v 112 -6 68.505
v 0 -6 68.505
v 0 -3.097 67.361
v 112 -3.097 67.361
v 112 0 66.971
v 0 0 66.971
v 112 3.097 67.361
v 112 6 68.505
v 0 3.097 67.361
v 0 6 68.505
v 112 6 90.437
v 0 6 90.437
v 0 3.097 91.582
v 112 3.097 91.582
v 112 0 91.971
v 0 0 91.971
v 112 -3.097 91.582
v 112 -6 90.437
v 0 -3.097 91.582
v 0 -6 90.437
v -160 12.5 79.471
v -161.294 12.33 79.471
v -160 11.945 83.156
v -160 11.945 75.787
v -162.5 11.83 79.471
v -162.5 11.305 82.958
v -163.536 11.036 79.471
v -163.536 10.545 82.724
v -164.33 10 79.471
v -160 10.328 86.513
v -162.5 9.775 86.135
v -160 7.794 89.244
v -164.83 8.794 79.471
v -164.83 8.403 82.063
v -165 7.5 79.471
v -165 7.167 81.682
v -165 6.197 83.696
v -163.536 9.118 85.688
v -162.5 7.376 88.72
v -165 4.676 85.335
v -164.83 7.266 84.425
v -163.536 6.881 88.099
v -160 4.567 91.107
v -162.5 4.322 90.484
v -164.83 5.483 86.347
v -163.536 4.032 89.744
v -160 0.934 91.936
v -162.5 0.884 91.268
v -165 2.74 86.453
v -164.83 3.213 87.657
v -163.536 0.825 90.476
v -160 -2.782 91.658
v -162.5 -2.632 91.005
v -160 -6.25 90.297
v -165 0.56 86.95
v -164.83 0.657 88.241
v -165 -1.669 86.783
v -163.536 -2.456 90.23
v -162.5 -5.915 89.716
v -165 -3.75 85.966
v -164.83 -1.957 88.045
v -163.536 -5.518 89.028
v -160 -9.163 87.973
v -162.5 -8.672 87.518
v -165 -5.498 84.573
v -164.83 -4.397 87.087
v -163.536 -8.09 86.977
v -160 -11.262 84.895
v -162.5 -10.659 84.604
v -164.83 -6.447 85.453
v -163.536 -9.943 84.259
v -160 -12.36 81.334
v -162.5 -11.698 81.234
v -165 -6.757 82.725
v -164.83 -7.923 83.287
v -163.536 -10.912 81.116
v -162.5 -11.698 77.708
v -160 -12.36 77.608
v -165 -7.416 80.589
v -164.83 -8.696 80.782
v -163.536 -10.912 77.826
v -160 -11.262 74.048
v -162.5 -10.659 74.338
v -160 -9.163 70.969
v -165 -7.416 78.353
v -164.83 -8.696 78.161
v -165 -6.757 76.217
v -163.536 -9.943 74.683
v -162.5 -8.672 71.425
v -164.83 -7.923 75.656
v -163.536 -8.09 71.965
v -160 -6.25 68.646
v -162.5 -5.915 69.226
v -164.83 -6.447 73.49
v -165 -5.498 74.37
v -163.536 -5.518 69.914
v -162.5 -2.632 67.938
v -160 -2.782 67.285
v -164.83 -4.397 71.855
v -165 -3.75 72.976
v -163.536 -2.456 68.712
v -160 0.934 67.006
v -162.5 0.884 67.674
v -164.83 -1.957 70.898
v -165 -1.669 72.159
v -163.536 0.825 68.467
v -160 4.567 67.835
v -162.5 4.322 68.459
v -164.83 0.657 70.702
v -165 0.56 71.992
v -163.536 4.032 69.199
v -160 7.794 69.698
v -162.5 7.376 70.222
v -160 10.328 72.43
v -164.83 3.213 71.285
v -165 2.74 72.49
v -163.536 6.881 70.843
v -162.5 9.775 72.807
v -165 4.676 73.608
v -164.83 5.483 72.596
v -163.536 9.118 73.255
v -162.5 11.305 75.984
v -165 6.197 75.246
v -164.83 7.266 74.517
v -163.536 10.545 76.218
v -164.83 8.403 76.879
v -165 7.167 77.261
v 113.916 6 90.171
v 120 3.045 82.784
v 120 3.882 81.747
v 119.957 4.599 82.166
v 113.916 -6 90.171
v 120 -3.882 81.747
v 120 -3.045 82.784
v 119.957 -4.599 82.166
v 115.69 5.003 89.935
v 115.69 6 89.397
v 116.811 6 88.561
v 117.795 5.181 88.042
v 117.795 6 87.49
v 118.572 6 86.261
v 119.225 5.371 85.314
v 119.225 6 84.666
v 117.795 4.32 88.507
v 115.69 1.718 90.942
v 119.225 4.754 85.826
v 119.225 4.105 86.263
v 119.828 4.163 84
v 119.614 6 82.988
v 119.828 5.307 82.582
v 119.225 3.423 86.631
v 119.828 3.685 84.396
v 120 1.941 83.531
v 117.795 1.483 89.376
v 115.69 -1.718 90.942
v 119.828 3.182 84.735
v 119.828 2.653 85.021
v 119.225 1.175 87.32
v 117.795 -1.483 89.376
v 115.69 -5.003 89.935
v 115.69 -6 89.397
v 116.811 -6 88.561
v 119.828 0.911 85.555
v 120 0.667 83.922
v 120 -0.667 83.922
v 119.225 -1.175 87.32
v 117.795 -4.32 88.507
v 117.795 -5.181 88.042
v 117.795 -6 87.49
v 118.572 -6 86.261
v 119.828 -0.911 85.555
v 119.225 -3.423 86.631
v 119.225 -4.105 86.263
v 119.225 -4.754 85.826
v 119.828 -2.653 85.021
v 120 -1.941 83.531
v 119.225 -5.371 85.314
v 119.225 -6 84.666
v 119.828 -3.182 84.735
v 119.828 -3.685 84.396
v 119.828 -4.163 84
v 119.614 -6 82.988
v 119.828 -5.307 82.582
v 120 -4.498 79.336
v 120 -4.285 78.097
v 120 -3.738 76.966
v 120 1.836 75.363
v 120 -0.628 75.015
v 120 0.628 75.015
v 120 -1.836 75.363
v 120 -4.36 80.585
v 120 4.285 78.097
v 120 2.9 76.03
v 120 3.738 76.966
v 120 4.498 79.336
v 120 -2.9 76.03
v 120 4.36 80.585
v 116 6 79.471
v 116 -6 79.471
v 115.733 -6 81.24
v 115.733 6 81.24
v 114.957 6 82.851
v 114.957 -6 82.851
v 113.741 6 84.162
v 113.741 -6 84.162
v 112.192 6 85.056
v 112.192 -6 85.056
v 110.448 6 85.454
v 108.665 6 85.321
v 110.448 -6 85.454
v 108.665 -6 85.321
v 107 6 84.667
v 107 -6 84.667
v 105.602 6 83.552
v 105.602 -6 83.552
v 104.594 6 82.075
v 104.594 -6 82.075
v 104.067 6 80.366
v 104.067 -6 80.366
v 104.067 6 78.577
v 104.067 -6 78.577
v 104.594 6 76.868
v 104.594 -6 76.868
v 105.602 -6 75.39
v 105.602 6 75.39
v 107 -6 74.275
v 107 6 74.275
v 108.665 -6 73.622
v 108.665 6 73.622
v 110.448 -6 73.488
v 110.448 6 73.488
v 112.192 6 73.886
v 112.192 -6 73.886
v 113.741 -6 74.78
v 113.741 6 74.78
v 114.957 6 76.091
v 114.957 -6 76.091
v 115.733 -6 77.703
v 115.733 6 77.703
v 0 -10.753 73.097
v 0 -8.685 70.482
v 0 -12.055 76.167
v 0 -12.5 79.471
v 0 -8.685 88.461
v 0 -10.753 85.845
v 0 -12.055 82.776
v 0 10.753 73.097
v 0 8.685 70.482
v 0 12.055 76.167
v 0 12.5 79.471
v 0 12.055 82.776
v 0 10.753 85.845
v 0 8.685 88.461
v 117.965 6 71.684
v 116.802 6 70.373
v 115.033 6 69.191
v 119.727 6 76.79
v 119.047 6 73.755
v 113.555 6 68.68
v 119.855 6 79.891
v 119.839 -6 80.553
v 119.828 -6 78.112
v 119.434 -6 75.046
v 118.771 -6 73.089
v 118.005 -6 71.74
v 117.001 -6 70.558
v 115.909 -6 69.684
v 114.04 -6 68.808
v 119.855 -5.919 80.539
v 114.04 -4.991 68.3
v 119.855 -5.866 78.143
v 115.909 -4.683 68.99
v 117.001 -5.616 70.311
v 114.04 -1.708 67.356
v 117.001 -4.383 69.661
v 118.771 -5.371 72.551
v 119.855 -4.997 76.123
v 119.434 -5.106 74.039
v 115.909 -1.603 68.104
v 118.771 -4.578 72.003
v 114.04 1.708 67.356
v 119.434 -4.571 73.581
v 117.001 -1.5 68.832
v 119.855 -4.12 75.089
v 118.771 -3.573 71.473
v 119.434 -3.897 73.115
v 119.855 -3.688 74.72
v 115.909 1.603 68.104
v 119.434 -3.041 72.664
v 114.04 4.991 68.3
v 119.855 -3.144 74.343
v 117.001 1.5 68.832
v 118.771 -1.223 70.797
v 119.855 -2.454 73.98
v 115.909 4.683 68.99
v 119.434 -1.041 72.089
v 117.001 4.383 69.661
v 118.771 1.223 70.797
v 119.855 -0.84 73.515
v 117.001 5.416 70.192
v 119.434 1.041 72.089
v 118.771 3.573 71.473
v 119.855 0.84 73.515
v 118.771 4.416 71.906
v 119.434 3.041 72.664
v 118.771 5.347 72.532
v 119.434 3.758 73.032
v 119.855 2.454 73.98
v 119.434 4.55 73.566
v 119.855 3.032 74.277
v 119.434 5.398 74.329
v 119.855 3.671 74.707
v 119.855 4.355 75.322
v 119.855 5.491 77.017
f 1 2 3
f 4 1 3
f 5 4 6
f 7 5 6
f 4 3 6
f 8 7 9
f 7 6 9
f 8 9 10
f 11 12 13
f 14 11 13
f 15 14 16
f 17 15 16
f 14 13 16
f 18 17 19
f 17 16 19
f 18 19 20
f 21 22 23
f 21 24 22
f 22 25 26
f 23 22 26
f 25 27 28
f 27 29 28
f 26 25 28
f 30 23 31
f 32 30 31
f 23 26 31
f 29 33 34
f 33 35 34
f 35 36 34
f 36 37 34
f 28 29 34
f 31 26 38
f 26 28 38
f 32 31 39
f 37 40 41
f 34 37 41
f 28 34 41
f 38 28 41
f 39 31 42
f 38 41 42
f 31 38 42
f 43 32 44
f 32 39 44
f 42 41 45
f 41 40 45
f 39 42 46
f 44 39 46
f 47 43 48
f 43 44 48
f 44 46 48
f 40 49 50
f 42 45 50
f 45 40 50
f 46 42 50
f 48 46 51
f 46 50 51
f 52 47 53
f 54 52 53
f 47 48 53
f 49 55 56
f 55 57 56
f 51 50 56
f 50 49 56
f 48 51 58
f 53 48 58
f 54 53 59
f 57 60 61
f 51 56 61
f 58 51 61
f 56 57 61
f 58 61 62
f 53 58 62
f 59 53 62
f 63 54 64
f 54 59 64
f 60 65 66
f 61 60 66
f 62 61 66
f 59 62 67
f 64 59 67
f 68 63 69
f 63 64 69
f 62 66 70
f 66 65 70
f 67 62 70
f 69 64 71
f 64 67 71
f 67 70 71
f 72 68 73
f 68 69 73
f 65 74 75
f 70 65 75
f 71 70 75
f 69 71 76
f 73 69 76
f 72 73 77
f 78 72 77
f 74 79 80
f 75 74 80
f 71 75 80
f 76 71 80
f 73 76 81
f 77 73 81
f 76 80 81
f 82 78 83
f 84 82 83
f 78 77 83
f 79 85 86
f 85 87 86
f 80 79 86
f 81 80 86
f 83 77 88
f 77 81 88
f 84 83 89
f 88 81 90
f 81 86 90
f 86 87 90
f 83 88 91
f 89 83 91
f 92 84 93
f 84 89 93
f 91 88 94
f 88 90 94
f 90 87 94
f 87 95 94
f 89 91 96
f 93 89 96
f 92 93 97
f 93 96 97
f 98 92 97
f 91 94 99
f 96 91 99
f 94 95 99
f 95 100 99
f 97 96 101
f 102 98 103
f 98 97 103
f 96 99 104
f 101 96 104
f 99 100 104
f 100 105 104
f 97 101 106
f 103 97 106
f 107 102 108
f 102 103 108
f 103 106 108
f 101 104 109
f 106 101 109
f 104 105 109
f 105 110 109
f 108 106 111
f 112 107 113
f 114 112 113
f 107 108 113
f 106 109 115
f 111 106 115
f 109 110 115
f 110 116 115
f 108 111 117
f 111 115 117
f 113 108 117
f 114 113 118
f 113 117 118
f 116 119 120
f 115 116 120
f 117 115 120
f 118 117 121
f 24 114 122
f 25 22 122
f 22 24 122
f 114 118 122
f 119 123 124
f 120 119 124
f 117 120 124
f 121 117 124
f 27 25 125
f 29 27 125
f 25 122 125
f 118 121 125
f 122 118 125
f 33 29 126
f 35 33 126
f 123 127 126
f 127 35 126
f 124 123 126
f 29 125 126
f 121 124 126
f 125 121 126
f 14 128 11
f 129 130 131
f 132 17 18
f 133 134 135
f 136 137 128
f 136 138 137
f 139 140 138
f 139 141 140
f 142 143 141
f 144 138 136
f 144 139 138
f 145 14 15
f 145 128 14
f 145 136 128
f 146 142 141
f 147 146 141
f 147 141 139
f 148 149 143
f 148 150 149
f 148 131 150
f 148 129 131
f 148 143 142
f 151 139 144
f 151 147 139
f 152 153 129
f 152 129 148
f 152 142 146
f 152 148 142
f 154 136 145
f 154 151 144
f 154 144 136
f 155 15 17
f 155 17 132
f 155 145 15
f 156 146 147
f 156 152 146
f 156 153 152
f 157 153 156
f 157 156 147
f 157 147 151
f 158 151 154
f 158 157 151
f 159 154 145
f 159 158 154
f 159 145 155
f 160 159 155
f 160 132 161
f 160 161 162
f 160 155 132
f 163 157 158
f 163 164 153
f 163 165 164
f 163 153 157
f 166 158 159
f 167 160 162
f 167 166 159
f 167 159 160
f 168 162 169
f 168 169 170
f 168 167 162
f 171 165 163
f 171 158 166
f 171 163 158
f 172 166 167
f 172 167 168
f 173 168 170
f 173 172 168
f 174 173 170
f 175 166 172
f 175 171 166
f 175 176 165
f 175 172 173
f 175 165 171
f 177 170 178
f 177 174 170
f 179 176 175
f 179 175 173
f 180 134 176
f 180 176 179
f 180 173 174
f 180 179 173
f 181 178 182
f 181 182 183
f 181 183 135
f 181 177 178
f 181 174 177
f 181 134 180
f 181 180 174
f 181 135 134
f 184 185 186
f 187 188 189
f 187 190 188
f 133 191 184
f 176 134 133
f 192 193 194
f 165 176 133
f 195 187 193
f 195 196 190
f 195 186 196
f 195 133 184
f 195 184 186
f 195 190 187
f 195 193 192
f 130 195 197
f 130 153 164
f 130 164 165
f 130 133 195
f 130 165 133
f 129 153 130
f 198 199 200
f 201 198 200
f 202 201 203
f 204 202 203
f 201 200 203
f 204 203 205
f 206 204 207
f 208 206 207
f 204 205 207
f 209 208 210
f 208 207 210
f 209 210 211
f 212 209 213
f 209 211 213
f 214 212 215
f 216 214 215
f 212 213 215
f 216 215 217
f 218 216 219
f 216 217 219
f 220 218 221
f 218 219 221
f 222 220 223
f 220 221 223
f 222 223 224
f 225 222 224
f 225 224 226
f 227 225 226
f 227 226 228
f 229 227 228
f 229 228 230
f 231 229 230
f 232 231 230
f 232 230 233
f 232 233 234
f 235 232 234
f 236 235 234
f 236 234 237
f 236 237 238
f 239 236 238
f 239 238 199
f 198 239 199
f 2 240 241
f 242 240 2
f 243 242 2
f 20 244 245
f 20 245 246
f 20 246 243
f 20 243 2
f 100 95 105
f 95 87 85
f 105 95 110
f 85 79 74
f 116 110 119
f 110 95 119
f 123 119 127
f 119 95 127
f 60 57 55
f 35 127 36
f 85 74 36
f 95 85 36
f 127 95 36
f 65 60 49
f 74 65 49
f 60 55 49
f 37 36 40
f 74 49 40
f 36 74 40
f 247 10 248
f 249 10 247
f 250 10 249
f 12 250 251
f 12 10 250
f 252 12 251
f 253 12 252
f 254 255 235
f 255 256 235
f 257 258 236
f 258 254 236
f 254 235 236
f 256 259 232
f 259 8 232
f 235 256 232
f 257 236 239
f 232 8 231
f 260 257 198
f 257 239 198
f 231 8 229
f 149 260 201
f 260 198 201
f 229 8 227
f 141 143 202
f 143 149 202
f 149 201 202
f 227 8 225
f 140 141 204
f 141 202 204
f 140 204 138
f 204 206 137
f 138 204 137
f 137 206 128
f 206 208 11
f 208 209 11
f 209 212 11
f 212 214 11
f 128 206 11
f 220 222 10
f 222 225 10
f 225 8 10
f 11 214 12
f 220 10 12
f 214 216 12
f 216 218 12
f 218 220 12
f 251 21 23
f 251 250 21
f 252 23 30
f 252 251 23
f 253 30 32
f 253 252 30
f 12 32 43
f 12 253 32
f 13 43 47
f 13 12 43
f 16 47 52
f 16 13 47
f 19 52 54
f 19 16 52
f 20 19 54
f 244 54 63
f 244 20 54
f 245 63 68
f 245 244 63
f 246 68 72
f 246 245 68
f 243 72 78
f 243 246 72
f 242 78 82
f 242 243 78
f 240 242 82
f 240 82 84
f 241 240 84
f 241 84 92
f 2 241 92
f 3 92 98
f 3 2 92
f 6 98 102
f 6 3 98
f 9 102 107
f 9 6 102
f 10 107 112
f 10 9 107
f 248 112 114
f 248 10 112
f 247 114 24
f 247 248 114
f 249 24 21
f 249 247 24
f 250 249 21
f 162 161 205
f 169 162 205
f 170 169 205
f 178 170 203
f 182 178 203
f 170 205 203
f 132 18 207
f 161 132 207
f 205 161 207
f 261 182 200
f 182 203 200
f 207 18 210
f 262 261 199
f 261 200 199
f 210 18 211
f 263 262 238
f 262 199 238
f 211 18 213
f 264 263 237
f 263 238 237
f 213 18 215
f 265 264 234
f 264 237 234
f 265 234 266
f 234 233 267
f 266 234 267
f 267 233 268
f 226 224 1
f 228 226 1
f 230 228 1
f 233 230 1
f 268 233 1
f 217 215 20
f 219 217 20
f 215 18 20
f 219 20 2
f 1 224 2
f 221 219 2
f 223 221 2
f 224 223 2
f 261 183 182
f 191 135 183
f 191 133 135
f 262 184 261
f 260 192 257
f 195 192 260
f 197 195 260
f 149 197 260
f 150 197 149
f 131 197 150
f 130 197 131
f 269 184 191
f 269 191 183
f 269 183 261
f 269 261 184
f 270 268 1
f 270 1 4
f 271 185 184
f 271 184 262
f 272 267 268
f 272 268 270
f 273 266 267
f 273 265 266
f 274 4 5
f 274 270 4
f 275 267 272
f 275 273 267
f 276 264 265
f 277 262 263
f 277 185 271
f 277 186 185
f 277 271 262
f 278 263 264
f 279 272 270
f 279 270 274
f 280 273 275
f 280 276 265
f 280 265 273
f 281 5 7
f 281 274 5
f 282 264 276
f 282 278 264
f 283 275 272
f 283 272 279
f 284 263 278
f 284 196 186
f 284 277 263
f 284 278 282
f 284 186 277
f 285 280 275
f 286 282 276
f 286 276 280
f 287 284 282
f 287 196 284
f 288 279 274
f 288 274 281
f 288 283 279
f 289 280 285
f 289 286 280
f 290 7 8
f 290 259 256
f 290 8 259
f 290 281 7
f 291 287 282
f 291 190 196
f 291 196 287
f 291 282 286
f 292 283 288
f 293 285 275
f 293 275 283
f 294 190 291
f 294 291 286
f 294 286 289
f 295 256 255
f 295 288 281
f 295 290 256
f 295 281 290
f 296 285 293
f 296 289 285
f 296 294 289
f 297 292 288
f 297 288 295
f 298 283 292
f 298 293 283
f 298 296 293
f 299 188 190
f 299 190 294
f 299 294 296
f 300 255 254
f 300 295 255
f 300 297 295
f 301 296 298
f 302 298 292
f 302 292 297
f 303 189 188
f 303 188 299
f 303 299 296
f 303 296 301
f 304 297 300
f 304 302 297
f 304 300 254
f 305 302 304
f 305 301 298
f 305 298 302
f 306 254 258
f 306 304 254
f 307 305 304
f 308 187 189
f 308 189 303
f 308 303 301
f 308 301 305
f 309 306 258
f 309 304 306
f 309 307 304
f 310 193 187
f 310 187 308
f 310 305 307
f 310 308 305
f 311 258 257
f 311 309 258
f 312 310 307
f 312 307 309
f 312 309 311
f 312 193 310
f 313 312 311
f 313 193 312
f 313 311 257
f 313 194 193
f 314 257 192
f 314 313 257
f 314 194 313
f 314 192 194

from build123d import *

# Parameters (mm, degrees)
F0_R        = 12.5
F1_DEPTH    = 165
F2_R        = 5
F5_DEPTH    = 120
F6_R        = 6
F7_DEPTH    = 18.501
F8_T2_ANGLE = 240.7472216417
F8_T4_ANGLE = 240.7472216417


# Not quite as in the source:
# - a fillet or chamfer that OpenCascade refuses, or shapes differently, is made with other operations: its cross-section is extruded or revolved along the edge and cut away or added


with BuildPart() as f1:
    # F0 (on Right) → F1 (new body)
    with BuildSketch(Plane.YZ):
        with Locations((0, 79.4712570496)):
            Circle(F0_R)
    extrude(amount=-F1_DEPTH)

    # F2
    f2_edges = [f1.edges().sort_by_distance(p)[0] for p in [
        (-165, -12.5, 79.471257),
    ]]
    fillet(f2_edges, radius=F2_R)

    # F4 (on face) → F5 (join)
    with BuildSketch(Plane.YZ):
        with BuildLine():
            ThreePointArc((6, 90.4371131493), (0, 91.9712570496), (-6, 90.4371131493))
            Line((-6, 90.4371131493), (-6, 68.5054009499))
            ThreePointArc((-6, 68.5054009499), (0, 66.9712570496), (6, 68.5054009499))
            Line((6, 68.5054009499), (6, 90.4371131493))
        make_face()
    extrude(amount=F5_DEPTH)

    # F6 (on face) → F7 (cut, through all)
    with BuildSketch(Plane.XZ.offset(6)):
        with Locations((110, 79.4712570496)):
            Circle(F6_R)
    extrude(amount=-F7_DEPTH, mode=Mode.SUBTRACT)

    # F8: fillet of radius 8 on 2 edges, made by hand

    # F8_s1 → F8_t2 (revolve, cut)
    with BuildSketch(Plane(origin=(0, 34.6682356906, 59.1529818038), x_dir=(1, 0, 0), z_dir=(0, 0.5056364556, 0.8627466458))):
        with BuildLine():
            ThreePointArc((112, -52.6835647356), (117.6568542495, -50.3404189851), (120, -44.6835647356))
            Line((120, -44.6835647356), (120, -52.6835647356))
            Line((120, -52.6835647356), (112, -52.6835647356))
        make_face()
    revolve(axis=Axis((120, 0, 79.4712570496), (1, 0, 0)), revolution_arc=F8_T2_ANGLE, mode=Mode.SUBTRACT)

    # F8_s3 → F8_t4 (revolve, cut)
    with BuildSketch(Plane(origin=(0, 34.6682356906, 59.1529818038), x_dir=(1, 0, 0), z_dir=(0, -0.5056364556, -0.8627466458))):
        with BuildLine():
            ThreePointArc((112, 27.6835647356), (117.6568542495, 30.0267104861), (120, 35.6835647356))
            Line((120, 35.6835647356), (120, 27.6835647356))
            Line((120, 27.6835647356), (112, 27.6835647356))
        make_face()
    revolve(axis=Axis((120, 0, 79.4712570496), (1, 0, 0)), revolution_arc=F8_T4_ANGLE, mode=Mode.SUBTRACT)


solid = f1.part
